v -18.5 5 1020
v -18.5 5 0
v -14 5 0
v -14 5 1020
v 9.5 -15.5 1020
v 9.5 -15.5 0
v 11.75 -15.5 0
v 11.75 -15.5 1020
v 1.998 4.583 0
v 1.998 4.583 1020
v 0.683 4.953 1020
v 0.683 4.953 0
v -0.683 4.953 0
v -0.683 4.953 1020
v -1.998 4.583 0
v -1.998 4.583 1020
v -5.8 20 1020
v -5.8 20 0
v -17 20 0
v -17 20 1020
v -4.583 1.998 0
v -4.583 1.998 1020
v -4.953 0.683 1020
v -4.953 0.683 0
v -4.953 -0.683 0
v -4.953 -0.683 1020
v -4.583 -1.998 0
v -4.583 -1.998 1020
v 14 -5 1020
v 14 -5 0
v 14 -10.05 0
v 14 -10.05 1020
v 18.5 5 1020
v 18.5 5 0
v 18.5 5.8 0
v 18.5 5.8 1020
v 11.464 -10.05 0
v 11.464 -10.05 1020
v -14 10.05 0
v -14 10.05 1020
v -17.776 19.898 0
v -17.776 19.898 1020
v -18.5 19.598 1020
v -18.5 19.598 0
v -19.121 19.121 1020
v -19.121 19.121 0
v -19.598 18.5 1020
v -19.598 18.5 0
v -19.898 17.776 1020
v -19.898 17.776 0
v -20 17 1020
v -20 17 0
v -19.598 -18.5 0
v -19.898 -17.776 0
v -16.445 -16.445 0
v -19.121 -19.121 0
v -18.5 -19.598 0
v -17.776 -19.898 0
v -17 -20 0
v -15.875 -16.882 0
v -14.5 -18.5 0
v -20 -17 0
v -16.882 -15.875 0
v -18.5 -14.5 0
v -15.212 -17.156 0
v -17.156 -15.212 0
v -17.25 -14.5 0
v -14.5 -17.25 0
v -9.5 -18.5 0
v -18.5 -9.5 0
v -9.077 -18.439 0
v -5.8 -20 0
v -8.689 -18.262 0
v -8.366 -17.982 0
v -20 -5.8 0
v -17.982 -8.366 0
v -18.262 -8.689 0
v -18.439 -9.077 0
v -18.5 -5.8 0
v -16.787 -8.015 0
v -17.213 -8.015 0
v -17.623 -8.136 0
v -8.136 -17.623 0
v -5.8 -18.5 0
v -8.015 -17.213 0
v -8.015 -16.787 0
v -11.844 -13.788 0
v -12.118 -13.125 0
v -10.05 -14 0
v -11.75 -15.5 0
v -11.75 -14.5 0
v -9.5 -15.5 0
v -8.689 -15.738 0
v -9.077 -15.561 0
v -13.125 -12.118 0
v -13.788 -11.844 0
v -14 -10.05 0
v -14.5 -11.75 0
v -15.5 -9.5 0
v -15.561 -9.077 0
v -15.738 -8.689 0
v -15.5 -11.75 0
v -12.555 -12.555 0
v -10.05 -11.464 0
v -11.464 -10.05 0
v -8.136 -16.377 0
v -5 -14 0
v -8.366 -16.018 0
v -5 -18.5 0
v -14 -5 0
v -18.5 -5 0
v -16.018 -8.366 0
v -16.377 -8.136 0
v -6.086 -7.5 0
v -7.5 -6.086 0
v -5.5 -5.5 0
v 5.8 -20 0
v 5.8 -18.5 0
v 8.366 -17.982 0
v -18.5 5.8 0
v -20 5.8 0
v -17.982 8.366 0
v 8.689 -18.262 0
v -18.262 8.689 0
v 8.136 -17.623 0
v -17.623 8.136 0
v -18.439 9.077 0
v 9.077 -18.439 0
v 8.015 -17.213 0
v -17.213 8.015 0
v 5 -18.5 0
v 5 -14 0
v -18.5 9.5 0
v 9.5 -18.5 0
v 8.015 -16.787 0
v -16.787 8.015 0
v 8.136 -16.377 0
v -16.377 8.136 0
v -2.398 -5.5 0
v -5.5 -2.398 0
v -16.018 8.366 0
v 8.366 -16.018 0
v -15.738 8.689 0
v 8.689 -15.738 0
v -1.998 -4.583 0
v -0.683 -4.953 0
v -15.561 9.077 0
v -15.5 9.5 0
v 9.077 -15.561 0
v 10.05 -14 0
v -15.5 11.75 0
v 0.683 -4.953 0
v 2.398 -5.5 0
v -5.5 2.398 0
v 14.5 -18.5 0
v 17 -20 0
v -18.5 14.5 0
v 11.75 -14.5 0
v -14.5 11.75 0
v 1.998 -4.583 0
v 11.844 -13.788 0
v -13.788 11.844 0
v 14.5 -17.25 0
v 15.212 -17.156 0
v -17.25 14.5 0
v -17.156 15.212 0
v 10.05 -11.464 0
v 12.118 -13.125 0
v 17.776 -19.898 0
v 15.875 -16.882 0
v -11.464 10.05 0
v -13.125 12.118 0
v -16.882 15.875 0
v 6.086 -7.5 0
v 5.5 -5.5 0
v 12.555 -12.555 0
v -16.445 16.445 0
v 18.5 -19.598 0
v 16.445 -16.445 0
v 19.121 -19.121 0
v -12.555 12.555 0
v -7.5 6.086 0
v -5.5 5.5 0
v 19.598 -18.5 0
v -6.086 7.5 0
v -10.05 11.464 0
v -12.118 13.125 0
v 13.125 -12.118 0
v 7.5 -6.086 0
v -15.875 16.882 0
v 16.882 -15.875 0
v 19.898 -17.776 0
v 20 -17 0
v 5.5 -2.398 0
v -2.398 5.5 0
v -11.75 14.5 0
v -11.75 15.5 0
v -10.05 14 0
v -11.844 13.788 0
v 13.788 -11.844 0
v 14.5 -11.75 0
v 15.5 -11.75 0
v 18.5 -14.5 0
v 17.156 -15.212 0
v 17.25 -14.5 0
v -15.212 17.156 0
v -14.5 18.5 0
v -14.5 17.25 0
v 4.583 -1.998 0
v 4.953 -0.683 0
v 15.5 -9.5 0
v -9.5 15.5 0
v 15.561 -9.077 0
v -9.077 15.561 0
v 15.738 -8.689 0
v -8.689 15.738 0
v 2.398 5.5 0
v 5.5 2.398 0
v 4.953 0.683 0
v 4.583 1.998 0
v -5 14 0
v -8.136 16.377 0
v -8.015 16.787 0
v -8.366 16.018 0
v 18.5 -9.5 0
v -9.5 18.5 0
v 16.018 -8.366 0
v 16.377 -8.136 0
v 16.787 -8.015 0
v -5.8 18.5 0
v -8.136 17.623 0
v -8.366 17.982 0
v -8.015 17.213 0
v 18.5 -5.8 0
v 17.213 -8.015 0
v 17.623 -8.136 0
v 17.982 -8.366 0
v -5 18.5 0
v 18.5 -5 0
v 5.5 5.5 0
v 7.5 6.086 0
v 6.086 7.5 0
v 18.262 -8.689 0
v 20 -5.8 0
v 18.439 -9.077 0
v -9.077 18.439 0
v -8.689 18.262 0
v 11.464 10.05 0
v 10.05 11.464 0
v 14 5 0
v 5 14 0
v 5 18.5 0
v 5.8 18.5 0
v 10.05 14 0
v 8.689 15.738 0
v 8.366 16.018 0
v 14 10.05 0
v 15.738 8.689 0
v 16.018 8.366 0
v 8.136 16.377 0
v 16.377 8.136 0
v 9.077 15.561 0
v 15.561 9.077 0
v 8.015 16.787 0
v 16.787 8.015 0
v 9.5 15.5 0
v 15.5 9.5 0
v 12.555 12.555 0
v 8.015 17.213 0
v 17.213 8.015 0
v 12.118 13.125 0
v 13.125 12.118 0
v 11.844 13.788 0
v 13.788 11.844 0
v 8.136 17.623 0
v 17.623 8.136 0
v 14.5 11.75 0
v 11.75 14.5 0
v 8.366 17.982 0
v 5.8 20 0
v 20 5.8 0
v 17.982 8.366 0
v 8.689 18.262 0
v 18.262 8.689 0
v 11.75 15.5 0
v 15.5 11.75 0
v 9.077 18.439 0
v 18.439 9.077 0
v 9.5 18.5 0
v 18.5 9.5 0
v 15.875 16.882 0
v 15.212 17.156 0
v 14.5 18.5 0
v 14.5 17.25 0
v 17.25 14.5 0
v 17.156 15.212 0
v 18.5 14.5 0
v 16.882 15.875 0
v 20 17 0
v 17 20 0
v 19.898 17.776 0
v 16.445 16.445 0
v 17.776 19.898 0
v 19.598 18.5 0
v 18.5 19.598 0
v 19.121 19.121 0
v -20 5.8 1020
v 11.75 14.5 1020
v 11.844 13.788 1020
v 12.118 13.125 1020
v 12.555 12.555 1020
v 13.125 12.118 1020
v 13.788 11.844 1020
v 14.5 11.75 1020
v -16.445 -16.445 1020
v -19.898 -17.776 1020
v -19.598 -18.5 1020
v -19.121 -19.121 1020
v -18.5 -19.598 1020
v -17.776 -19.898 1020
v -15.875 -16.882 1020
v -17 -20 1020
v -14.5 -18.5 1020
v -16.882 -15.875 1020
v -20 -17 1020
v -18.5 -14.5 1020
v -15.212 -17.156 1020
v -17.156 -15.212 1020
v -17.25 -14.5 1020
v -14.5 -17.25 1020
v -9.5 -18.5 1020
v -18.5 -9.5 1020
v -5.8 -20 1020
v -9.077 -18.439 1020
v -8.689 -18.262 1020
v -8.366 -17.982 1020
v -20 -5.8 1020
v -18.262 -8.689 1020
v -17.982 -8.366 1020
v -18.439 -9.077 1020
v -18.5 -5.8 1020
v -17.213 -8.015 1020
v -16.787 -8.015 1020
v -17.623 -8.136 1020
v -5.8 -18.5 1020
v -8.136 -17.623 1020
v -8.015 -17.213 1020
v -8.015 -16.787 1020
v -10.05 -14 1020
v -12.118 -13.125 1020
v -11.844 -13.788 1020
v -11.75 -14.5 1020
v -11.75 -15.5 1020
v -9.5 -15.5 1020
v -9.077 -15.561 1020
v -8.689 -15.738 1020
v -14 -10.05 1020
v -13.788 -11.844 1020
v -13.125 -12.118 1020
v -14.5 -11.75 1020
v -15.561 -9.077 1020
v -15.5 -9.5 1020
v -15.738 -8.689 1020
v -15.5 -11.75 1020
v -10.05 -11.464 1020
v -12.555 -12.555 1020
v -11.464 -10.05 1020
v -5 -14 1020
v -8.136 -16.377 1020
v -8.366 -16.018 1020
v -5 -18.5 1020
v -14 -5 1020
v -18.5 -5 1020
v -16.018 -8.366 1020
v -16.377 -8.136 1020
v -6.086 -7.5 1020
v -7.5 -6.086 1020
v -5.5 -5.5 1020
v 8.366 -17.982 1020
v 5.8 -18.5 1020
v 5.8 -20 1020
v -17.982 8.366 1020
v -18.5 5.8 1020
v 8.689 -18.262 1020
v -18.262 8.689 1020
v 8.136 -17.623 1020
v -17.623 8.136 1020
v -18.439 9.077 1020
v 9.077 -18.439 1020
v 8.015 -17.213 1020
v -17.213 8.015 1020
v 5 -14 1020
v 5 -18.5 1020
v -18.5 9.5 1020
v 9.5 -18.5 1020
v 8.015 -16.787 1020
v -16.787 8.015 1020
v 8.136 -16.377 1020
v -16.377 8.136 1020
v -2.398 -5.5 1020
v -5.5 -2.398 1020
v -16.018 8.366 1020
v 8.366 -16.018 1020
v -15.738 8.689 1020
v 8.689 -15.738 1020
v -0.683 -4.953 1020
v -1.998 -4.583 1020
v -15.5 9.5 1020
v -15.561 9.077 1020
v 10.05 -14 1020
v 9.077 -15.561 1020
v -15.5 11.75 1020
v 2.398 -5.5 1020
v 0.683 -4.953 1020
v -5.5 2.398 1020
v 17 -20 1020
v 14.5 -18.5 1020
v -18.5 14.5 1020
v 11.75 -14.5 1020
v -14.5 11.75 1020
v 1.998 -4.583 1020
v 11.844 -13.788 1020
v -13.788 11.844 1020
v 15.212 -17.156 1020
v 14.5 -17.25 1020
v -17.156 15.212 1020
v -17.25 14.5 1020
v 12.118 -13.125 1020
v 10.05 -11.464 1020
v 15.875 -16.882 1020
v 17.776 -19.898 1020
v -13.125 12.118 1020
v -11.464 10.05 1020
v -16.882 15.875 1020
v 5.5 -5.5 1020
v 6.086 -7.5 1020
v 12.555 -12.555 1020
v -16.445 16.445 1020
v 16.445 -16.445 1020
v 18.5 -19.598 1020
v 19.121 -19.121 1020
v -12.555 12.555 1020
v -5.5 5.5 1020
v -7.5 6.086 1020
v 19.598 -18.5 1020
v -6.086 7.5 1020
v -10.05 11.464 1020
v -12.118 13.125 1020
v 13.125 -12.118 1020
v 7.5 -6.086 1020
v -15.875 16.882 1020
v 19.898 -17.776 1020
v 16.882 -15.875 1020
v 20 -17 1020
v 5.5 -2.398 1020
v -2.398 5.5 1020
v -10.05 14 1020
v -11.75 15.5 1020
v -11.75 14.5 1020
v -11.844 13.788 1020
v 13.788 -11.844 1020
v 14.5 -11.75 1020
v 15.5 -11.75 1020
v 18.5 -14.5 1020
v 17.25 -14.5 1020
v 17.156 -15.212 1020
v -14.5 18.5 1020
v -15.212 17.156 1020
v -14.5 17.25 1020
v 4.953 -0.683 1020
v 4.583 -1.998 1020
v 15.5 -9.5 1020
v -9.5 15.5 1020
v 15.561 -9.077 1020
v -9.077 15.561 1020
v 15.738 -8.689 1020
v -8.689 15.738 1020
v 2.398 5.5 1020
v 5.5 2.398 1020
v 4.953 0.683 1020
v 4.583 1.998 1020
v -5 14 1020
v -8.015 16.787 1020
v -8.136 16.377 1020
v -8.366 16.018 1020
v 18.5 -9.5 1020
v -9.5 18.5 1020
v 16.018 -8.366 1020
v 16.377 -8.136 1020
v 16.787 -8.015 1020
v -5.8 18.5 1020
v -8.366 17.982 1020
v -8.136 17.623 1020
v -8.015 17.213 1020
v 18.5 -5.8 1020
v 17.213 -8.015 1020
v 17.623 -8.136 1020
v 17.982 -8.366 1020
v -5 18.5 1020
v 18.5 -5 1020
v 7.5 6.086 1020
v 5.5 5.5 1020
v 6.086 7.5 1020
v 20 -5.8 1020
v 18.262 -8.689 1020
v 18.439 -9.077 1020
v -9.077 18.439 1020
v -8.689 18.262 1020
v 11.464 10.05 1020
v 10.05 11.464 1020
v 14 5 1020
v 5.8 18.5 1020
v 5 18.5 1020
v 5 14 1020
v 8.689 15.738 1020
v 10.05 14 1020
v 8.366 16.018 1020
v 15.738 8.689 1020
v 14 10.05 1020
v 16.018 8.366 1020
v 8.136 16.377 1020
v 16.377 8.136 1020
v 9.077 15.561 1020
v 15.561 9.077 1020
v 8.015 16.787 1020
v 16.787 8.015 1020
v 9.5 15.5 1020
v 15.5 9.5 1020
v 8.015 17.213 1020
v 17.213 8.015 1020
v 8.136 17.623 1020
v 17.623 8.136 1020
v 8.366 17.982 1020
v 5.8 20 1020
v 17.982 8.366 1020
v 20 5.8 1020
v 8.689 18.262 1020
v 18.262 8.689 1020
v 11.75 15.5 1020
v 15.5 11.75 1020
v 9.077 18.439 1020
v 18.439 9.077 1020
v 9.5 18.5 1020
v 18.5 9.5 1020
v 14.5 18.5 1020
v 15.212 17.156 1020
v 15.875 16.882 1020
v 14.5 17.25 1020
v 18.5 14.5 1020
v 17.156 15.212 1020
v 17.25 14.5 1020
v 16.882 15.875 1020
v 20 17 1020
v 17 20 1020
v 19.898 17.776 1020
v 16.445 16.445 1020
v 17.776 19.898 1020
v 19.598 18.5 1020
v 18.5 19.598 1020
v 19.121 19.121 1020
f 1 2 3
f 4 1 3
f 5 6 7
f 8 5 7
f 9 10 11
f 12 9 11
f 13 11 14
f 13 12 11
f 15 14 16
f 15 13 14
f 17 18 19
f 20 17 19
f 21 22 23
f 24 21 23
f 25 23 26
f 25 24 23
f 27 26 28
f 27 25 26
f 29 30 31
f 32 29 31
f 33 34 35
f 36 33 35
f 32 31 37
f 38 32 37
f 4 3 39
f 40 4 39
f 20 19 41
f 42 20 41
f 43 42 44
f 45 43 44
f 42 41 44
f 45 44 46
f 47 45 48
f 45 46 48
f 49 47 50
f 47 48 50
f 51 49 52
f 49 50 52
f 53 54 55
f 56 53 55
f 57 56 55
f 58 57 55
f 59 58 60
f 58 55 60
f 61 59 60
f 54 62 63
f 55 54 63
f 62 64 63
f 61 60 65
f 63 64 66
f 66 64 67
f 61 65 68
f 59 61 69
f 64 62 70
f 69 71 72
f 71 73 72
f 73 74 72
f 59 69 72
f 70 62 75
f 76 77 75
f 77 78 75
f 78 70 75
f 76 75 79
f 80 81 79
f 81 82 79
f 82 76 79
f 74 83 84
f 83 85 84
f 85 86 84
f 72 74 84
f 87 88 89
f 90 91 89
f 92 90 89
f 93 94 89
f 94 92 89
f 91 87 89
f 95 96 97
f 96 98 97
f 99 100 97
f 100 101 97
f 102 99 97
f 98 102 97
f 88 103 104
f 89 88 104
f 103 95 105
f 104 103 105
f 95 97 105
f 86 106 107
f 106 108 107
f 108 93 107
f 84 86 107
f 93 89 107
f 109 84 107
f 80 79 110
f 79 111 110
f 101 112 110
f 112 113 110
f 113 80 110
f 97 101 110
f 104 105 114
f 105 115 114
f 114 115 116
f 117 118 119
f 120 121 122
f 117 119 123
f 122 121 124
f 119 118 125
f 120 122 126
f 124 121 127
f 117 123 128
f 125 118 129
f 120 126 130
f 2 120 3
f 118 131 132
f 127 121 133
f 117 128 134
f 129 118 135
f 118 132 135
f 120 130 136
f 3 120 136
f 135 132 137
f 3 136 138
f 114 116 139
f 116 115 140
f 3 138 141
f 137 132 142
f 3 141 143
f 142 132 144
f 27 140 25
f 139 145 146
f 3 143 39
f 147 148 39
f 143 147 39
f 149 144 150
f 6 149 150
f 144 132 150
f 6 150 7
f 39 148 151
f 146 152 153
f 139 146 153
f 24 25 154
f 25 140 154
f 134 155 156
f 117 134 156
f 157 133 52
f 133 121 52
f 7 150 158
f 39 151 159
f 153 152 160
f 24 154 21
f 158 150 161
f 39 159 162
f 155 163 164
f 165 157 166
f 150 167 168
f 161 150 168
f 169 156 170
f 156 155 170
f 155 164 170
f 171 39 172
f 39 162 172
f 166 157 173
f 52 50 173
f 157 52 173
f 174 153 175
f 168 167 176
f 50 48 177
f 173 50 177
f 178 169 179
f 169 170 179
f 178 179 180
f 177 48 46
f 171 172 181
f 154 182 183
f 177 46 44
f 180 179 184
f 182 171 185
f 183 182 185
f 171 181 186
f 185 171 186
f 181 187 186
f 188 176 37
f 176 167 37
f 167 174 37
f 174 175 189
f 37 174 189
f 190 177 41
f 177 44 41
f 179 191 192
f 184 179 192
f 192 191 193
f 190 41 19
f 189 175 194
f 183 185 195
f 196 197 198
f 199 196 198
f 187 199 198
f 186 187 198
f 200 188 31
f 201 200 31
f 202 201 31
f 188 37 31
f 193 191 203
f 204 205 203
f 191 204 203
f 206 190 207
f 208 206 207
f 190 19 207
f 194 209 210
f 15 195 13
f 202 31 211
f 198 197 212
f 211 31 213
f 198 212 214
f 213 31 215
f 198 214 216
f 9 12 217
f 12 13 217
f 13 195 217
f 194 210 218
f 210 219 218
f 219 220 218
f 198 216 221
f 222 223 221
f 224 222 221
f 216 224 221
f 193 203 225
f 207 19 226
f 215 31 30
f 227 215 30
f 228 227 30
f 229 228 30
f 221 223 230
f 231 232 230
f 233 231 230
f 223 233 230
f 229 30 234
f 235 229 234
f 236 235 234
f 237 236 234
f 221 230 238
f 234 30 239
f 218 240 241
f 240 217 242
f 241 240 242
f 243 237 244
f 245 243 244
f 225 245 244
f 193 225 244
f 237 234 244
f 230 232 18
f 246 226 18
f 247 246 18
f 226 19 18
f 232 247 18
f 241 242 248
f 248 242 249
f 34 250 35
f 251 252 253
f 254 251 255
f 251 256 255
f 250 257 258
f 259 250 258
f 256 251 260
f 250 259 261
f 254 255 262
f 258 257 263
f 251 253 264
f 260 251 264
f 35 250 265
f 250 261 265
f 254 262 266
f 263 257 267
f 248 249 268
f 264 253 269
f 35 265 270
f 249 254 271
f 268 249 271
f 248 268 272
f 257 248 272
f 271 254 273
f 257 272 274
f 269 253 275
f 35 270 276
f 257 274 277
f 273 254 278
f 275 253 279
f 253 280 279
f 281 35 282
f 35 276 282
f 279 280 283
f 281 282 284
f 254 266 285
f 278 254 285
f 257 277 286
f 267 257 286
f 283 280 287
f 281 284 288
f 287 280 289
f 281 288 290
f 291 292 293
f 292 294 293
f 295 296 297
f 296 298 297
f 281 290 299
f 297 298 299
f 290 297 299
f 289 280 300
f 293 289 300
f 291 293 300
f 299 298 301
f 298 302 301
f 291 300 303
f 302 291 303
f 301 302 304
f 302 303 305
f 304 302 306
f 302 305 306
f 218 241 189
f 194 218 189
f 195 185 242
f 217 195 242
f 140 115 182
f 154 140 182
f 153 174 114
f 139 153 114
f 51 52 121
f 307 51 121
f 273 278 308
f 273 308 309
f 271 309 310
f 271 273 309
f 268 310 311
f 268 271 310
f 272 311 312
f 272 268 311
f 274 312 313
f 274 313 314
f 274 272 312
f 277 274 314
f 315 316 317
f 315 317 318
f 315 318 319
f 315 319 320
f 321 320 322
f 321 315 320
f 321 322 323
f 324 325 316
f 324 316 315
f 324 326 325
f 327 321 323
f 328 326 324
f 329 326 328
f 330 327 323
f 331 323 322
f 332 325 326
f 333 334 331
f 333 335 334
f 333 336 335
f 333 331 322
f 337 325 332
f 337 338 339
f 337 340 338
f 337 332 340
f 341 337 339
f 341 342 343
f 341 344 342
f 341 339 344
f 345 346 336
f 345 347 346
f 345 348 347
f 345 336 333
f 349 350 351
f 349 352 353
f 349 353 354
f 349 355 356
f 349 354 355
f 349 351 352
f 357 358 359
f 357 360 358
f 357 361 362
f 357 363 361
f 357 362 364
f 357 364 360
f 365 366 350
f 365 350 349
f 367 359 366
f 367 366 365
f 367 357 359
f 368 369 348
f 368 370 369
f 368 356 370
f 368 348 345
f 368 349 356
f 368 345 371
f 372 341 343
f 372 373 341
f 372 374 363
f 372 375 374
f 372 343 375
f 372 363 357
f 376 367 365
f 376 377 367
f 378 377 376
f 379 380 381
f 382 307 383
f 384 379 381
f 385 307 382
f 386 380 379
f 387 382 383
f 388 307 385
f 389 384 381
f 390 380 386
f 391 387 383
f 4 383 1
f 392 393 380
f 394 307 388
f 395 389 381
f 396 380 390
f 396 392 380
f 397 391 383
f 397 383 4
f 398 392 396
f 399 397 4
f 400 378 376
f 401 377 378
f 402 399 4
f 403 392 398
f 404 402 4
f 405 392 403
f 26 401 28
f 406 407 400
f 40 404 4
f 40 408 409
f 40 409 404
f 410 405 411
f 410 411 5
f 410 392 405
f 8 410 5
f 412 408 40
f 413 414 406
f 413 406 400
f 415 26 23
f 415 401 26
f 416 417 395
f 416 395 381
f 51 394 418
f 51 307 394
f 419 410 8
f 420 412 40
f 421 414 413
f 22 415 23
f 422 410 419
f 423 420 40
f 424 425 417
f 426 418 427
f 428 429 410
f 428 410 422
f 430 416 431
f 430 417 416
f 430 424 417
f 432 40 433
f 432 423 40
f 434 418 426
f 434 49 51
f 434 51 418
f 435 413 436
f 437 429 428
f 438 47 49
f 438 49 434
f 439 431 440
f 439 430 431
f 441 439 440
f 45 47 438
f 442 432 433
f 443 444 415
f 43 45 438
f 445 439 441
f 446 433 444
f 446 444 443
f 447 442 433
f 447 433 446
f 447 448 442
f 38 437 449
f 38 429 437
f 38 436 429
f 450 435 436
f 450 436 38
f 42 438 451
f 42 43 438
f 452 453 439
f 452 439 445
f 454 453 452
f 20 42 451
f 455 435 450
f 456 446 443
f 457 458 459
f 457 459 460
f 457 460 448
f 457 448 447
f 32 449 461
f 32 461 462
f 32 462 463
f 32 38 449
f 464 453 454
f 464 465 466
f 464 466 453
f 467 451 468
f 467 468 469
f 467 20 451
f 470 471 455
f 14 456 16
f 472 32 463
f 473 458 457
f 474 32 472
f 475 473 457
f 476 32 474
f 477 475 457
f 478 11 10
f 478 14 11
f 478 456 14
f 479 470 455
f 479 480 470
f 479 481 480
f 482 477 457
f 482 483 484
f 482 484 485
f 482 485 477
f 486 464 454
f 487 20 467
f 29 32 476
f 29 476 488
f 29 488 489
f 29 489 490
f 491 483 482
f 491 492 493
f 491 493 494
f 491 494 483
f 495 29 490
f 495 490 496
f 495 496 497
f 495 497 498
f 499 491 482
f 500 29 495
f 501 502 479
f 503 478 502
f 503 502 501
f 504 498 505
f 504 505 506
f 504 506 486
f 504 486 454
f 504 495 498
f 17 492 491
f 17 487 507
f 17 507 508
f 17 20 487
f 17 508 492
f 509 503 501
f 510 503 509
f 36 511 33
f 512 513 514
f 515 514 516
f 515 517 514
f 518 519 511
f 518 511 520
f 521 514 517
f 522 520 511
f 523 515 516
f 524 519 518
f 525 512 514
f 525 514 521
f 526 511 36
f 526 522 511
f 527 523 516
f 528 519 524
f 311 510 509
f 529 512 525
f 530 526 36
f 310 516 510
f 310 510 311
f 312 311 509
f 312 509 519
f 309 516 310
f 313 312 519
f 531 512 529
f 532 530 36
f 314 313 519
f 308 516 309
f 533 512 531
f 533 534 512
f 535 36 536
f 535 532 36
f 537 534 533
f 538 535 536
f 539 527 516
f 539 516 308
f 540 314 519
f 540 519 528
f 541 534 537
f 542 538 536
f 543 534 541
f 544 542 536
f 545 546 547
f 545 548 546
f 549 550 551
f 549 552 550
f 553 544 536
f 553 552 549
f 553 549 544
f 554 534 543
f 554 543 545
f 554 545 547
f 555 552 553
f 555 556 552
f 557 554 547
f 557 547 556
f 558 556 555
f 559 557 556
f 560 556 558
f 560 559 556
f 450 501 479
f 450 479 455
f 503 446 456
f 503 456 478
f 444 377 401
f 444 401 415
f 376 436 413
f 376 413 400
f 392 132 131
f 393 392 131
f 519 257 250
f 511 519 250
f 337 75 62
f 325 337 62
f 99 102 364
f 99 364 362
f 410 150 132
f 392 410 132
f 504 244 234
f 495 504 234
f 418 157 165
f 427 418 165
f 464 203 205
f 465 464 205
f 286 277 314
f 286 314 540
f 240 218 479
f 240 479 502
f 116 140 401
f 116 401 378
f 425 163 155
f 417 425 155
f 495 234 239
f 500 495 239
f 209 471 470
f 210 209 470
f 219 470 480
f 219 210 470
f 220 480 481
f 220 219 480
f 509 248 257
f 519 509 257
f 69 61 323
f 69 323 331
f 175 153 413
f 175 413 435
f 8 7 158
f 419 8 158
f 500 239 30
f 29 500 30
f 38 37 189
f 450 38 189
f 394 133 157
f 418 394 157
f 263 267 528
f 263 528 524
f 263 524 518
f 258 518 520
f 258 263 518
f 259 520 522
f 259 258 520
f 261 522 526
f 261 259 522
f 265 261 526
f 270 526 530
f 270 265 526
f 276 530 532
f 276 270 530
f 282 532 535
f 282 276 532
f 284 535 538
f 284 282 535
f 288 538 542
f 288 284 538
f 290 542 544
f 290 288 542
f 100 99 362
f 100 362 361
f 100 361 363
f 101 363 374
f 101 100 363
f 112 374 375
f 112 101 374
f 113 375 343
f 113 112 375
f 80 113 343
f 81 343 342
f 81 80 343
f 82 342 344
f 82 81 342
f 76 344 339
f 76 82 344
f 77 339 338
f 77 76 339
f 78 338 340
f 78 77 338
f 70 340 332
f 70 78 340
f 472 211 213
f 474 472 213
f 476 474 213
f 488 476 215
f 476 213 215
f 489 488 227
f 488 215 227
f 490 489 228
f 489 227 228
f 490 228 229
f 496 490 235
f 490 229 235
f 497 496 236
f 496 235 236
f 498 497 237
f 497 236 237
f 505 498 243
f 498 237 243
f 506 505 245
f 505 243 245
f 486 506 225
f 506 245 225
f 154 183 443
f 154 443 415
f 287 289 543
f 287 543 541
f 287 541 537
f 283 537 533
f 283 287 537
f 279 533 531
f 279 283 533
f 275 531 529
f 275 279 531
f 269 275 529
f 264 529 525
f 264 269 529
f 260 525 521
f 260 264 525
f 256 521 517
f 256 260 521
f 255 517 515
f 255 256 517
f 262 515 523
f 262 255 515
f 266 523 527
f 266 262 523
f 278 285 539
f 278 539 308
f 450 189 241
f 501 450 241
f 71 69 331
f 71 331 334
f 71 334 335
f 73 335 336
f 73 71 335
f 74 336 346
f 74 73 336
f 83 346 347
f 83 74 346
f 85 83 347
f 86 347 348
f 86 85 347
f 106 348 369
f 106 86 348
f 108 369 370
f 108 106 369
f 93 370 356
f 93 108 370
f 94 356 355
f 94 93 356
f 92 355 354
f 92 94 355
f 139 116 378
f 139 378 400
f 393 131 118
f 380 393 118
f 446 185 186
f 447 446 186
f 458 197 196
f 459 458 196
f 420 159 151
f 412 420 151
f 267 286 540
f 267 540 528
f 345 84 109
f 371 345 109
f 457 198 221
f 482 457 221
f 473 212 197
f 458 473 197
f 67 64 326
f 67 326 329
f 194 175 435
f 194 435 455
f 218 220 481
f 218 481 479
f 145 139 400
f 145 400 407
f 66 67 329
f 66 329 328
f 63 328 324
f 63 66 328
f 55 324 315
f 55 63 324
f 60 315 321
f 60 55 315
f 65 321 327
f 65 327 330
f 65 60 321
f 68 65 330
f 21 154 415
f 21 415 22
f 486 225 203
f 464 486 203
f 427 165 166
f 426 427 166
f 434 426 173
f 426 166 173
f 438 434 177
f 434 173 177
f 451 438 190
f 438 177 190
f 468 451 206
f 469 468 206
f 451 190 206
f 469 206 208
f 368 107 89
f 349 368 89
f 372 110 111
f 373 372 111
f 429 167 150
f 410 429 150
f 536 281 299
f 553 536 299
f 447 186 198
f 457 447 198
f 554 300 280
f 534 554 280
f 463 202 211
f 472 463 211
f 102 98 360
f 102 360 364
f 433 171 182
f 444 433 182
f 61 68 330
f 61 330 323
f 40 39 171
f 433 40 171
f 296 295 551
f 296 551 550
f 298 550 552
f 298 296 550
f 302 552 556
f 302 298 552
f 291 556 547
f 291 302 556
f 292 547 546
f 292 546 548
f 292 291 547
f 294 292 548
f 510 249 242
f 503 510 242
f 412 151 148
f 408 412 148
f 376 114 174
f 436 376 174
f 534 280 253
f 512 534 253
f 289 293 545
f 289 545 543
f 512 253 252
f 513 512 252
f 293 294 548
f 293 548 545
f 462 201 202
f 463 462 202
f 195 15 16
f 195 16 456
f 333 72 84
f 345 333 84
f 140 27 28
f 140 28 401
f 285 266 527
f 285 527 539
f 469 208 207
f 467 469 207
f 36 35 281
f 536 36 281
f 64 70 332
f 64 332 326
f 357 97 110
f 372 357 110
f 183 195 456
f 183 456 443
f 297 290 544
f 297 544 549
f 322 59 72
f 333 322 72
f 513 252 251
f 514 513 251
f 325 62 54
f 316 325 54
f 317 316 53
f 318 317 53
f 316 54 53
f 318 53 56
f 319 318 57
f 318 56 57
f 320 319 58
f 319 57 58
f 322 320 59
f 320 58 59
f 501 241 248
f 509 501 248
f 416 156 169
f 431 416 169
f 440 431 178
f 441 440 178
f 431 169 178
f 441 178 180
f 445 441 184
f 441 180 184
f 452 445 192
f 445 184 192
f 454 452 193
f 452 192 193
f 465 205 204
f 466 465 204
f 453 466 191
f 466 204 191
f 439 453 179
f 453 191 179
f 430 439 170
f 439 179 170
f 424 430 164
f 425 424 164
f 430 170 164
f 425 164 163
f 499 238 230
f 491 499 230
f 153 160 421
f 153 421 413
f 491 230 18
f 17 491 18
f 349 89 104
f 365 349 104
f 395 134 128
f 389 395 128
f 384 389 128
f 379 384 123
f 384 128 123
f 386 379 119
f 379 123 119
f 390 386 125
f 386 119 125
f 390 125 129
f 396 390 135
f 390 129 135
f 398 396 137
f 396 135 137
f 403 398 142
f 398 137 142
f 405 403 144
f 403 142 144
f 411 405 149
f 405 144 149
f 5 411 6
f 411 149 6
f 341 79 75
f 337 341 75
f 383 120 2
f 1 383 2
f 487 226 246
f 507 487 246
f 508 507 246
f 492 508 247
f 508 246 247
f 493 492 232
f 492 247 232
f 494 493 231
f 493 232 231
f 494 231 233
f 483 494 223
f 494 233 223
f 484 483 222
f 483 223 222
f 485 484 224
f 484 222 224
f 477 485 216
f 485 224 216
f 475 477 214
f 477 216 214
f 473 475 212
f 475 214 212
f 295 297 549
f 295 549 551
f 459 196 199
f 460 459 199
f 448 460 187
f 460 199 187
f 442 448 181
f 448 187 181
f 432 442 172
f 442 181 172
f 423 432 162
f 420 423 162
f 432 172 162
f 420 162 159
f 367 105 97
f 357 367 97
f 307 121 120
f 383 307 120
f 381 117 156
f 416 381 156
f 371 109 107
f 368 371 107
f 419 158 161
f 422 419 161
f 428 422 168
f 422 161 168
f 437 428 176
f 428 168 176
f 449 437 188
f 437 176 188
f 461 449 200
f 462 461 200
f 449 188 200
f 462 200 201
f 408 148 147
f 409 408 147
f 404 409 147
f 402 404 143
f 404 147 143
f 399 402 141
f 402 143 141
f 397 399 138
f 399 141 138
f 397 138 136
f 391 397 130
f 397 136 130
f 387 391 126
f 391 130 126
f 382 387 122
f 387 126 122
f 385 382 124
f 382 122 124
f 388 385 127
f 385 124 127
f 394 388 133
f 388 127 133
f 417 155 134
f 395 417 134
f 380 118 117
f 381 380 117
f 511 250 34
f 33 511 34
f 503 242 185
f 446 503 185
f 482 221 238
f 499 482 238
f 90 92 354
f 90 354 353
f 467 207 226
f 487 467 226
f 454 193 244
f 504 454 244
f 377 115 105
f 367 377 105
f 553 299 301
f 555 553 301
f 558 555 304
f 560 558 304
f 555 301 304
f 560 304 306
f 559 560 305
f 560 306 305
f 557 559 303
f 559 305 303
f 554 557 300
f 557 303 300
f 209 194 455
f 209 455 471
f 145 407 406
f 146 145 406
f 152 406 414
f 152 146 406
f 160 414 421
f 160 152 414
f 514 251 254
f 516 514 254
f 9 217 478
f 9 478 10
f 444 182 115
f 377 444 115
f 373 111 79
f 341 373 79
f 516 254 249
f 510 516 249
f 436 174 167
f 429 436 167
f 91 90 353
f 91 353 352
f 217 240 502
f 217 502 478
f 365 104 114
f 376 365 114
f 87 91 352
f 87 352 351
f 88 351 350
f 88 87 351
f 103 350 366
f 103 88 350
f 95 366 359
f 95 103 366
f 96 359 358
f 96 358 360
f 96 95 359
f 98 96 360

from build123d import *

# Parameters (mm, degrees)
EXTRUDE1_DEPTH = 1020


with BuildPart() as part:
    # Sketch1 → Extrude1 (new body)
    with BuildSketch(Plane.XY):
        with BuildLine():
            Line((5.8, -20), (17, -20))
            ThreePointArc((17, -20), (19.121320344, -19.121320344), (20, -17))
            Line((20, -17), (20, -5.8))
            Line((20, -5.8), (18.5, -5.8))
            Line((18.5, -5.8), (18.5, -5))
            Line((18.5, -5), (14, -5))
            Line((14, -5), (14, -10.05))
            Line((14, -10.05), (11.464213562, -10.05))
            Line((11.464213562, -10.05), (7.5, -6.085786438))
            Line((7.5, -6.085786438), (7.5, 6.085786438))
            Line((7.5, 6.085786438), (11.464213562, 10.05))
            Line((11.464213562, 10.05), (14, 10.05))
            Line((14, 10.05), (14, 5))
            Line((14, 5), (18.5, 5))
            Line((18.5, 5), (18.5, 5.8))
            Line((18.5, 5.8), (20, 5.8))
            Line((20, 5.8), (20, 17))
            ThreePointArc((20, 17), (19.121320344, 19.121320344), (17, 20))
            Line((17, 20), (5.8, 20))
            Line((5.8, 20), (5.8, 18.5))
            Line((5.8, 18.5), (5, 18.5))
            Line((5, 18.5), (5, 14))
            Line((5, 14), (10.05, 14))
            Line((10.05, 14), (10.05, 11.464213562))
            Line((10.05, 11.464213562), (6.085786438, 7.5))
            Line((6.085786438, 7.5), (-6.085786438, 7.5))
            Line((-6.085786438, 7.5), (-10.05, 11.464213562))
            Line((-10.05, 11.464213562), (-10.05, 14))
            Line((-10.05, 14), (-5, 14))
            Line((-5, 14), (-5, 18.5))
            Line((-5, 18.5), (-5.8, 18.5))
            Line((-5.8, 18.5), (-5.8, 20))
            Line((-5.8, 20), (-17, 20))
            ThreePointArc((-17, 20), (-19.121320344, 19.121320344), (-20, 17))
            Line((-20, 17), (-20, 5.8))
            Line((-20, 5.8), (-18.5, 5.8))
            Line((-18.5, 5.8), (-18.5, 5))
            Line((-18.5, 5), (-14, 5))
            Line((-14, 5), (-14, 10.05))
            Line((-14, 10.05), (-11.464213562, 10.05))
            Line((-11.464213562, 10.05), (-7.5, 6.085786438))
            Line((-7.5, 6.085786438), (-7.5, -6.085786438))
            Line((-7.5, -6.085786438), (-11.464213562, -10.05))
            Line((-11.464213562, -10.05), (-14, -10.05))
            Line((-14, -10.05), (-14, -5))
            Line((-14, -5), (-18.5, -5))
            Line((-18.5, -5), (-18.5, -5.8))
            Line((-18.5, -5.8), (-20, -5.8))
            Line((-20, -5.8), (-20, -17))
            ThreePointArc((-20, -17), (-19.121320344, -19.121320344), (-17, -20))
            Line((-17, -20), (-5.8, -20))
            Line((-5.8, -20), (-5.8, -18.5))
            Line((-5.8, -18.5), (-5, -18.5))
            Line((-5, -18.5), (-5, -14))
            Line((-5, -14), (-10.05, -14))
            Line((-10.05, -14), (-10.05, -11.464213562))
            Line((-10.05, -11.464213562), (-6.085786438, -7.5))
            Line((-6.085786438, -7.5), (6.085786438, -7.5))
            Line((6.085786438, -7.5), (10.05, -11.464213562))
            Line((10.05, -11.464213562), (10.05, -14))
            Line((10.05, -14), (5, -14))
            Line((5, -14), (5, -18.5))
            Line((5, -18.5), (5.8, -18.5))
            Line((5.8, -18.5), (5.8, -20))
        make_face()
        with BuildLine():
            Line((14.5, -18.5), (9.5, -18.5))
            ThreePointArc((9.5, -18.5), (8, -17), (9.5, -15.5))
            Line((9.5, -15.5), (11.75, -15.5))
            Line((11.75, -15.5), (11.75, -14.5))
            ThreePointArc((11.75, -14.5), (12.555456352, -12.555456352), (14.5, -11.75))
            Line((14.5, -11.75), (15.5, -11.75))
            Line((15.5, -11.75), (15.5, -9.5))
            ThreePointArc((15.5, -9.5), (17, -8), (18.5, -9.5))
            Line((18.5, -9.5), (18.5, -14.5))
            Line((18.5, -14.5), (17.25, -14.5))
            ThreePointArc((17.25, -14.5), (16.444543648, -16.444543648), (14.5, -17.25))
            Line((14.5, -17.25), (14.5, -18.5))
        make_face(mode=Mode.SUBTRACT)
        with BuildLine():
            Line((18.5, 14.5), (17.25, 14.5))
            ThreePointArc((17.25, 14.5), (16.444543648, 16.444543648), (14.5, 17.25))
            Line((14.5, 17.25), (14.5, 18.5))
            Line((14.5, 18.5), (9.5, 18.5))
            ThreePointArc((9.5, 18.5), (8, 17), (9.5, 15.5))
            Line((9.5, 15.5), (11.75, 15.5))
            Line((11.75, 15.5), (11.75, 14.5))
            ThreePointArc((11.75, 14.5), (12.555456352, 12.555456352), (14.5, 11.75))
            Line((14.5, 11.75), (15.5, 11.75))
            Line((15.5, 11.75), (15.5, 9.5))
            ThreePointArc((15.5, 9.5), (17, 8), (18.5, 9.5))
            Line((18.5, 9.5), (18.5, 14.5))
        make_face(mode=Mode.SUBTRACT)
        with BuildLine():
            Line((5.5, 5.5), (2.397915762, 5.5))
            Line((2.397915762, 5.5), (1.998263135, 4.583333333))
            ThreePointArc((1.998263135, 4.583333333), (0, 5), (-1.998263135, 4.583333333))
            Line((-1.998263135, 4.583333333), (-2.397915762, 5.5))
            Line((-2.397915762, 5.5), (-5.5, 5.5))
            Line((-5.5, 5.5), (-5.5, 2.397915762))
            Line((-5.5, 2.397915762), (-4.583333333, 1.998263135))
            ThreePointArc((-4.583333333, 1.998263135), (-5, 0), (-4.583333333, -1.998263135))
            Line((-4.583333333, -1.998263135), (-5.5, -2.397915762))
            Line((-5.5, -2.397915762), (-5.5, -5.5))
            Line((-5.5, -5.5), (-2.397915762, -5.5))
            Line((-2.397915762, -5.5), (-1.998263135, -4.583333333))
            ThreePointArc((-1.998263135, -4.583333333), (0, -5), (1.998263135, -4.583333333))
            Line((1.998263135, -4.583333333), (2.397915762, -5.5))
            Line((2.397915762, -5.5), (5.5, -5.5))
            Line((5.5, -5.5), (5.5, -2.397915762))
            Line((5.5, -2.397915762), (4.583333333, -1.998263135))
            ThreePointArc((4.583333333, -1.998263135), (5, 0), (4.583333333, 1.998263135))
            Line((4.583333333, 1.998263135), (5.5, 2.397915762))
            Line((5.5, 2.397915762), (5.5, 5.5))
        make_face(mode=Mode.SUBTRACT)
        with BuildLine():
            Line((-18.5, -14.5), (-17.25, -14.5))
            ThreePointArc((-17.25, -14.5), (-16.444543648, -16.444543648), (-14.5, -17.25))
            Line((-14.5, -17.25), (-14.5, -18.5))
            Line((-14.5, -18.5), (-9.5, -18.5))
            ThreePointArc((-9.5, -18.5), (-8, -17), (-9.5, -15.5))
            Line((-9.5, -15.5), (-11.75, -15.5))
            Line((-11.75, -15.5), (-11.75, -14.5))
            ThreePointArc((-11.75, -14.5), (-12.555456352, -12.555456352), (-14.5, -11.75))
            Line((-14.5, -11.75), (-15.5, -11.75))
            Line((-15.5, -11.75), (-15.5, -9.5))
            ThreePointArc((-15.5, -9.5), (-17, -8), (-18.5, -9.5))
            Line((-18.5, -9.5), (-18.5, -14.5))
        make_face(mode=Mode.SUBTRACT)
        with BuildLine():
            Line((-14.5, 18.5), (-9.5, 18.5))
            ThreePointArc((-9.5, 18.5), (-8, 17), (-9.5, 15.5))
            Line((-9.5, 15.5), (-11.75, 15.5))
            Line((-11.75, 15.5), (-11.75, 14.5))
            ThreePointArc((-11.75, 14.5), (-12.555456352, 12.555456352), (-14.5, 11.75))
            Line((-14.5, 11.75), (-15.5, 11.75))
            Line((-15.5, 11.75), (-15.5, 9.5))
            ThreePointArc((-15.5, 9.5), (-17, 8), (-18.5, 9.5))
            Line((-18.5, 9.5), (-18.5, 14.5))
            Line((-18.5, 14.5), (-17.25, 14.5))
            ThreePointArc((-17.25, 14.5), (-16.444543648, 16.444543648), (-14.5, 17.25))
            Line((-14.5, 17.25), (-14.5, 18.5))
        make_face(mode=Mode.SUBTRACT)
    extrude(amount=EXTRUDE1_DEPTH)


solid = part.part
